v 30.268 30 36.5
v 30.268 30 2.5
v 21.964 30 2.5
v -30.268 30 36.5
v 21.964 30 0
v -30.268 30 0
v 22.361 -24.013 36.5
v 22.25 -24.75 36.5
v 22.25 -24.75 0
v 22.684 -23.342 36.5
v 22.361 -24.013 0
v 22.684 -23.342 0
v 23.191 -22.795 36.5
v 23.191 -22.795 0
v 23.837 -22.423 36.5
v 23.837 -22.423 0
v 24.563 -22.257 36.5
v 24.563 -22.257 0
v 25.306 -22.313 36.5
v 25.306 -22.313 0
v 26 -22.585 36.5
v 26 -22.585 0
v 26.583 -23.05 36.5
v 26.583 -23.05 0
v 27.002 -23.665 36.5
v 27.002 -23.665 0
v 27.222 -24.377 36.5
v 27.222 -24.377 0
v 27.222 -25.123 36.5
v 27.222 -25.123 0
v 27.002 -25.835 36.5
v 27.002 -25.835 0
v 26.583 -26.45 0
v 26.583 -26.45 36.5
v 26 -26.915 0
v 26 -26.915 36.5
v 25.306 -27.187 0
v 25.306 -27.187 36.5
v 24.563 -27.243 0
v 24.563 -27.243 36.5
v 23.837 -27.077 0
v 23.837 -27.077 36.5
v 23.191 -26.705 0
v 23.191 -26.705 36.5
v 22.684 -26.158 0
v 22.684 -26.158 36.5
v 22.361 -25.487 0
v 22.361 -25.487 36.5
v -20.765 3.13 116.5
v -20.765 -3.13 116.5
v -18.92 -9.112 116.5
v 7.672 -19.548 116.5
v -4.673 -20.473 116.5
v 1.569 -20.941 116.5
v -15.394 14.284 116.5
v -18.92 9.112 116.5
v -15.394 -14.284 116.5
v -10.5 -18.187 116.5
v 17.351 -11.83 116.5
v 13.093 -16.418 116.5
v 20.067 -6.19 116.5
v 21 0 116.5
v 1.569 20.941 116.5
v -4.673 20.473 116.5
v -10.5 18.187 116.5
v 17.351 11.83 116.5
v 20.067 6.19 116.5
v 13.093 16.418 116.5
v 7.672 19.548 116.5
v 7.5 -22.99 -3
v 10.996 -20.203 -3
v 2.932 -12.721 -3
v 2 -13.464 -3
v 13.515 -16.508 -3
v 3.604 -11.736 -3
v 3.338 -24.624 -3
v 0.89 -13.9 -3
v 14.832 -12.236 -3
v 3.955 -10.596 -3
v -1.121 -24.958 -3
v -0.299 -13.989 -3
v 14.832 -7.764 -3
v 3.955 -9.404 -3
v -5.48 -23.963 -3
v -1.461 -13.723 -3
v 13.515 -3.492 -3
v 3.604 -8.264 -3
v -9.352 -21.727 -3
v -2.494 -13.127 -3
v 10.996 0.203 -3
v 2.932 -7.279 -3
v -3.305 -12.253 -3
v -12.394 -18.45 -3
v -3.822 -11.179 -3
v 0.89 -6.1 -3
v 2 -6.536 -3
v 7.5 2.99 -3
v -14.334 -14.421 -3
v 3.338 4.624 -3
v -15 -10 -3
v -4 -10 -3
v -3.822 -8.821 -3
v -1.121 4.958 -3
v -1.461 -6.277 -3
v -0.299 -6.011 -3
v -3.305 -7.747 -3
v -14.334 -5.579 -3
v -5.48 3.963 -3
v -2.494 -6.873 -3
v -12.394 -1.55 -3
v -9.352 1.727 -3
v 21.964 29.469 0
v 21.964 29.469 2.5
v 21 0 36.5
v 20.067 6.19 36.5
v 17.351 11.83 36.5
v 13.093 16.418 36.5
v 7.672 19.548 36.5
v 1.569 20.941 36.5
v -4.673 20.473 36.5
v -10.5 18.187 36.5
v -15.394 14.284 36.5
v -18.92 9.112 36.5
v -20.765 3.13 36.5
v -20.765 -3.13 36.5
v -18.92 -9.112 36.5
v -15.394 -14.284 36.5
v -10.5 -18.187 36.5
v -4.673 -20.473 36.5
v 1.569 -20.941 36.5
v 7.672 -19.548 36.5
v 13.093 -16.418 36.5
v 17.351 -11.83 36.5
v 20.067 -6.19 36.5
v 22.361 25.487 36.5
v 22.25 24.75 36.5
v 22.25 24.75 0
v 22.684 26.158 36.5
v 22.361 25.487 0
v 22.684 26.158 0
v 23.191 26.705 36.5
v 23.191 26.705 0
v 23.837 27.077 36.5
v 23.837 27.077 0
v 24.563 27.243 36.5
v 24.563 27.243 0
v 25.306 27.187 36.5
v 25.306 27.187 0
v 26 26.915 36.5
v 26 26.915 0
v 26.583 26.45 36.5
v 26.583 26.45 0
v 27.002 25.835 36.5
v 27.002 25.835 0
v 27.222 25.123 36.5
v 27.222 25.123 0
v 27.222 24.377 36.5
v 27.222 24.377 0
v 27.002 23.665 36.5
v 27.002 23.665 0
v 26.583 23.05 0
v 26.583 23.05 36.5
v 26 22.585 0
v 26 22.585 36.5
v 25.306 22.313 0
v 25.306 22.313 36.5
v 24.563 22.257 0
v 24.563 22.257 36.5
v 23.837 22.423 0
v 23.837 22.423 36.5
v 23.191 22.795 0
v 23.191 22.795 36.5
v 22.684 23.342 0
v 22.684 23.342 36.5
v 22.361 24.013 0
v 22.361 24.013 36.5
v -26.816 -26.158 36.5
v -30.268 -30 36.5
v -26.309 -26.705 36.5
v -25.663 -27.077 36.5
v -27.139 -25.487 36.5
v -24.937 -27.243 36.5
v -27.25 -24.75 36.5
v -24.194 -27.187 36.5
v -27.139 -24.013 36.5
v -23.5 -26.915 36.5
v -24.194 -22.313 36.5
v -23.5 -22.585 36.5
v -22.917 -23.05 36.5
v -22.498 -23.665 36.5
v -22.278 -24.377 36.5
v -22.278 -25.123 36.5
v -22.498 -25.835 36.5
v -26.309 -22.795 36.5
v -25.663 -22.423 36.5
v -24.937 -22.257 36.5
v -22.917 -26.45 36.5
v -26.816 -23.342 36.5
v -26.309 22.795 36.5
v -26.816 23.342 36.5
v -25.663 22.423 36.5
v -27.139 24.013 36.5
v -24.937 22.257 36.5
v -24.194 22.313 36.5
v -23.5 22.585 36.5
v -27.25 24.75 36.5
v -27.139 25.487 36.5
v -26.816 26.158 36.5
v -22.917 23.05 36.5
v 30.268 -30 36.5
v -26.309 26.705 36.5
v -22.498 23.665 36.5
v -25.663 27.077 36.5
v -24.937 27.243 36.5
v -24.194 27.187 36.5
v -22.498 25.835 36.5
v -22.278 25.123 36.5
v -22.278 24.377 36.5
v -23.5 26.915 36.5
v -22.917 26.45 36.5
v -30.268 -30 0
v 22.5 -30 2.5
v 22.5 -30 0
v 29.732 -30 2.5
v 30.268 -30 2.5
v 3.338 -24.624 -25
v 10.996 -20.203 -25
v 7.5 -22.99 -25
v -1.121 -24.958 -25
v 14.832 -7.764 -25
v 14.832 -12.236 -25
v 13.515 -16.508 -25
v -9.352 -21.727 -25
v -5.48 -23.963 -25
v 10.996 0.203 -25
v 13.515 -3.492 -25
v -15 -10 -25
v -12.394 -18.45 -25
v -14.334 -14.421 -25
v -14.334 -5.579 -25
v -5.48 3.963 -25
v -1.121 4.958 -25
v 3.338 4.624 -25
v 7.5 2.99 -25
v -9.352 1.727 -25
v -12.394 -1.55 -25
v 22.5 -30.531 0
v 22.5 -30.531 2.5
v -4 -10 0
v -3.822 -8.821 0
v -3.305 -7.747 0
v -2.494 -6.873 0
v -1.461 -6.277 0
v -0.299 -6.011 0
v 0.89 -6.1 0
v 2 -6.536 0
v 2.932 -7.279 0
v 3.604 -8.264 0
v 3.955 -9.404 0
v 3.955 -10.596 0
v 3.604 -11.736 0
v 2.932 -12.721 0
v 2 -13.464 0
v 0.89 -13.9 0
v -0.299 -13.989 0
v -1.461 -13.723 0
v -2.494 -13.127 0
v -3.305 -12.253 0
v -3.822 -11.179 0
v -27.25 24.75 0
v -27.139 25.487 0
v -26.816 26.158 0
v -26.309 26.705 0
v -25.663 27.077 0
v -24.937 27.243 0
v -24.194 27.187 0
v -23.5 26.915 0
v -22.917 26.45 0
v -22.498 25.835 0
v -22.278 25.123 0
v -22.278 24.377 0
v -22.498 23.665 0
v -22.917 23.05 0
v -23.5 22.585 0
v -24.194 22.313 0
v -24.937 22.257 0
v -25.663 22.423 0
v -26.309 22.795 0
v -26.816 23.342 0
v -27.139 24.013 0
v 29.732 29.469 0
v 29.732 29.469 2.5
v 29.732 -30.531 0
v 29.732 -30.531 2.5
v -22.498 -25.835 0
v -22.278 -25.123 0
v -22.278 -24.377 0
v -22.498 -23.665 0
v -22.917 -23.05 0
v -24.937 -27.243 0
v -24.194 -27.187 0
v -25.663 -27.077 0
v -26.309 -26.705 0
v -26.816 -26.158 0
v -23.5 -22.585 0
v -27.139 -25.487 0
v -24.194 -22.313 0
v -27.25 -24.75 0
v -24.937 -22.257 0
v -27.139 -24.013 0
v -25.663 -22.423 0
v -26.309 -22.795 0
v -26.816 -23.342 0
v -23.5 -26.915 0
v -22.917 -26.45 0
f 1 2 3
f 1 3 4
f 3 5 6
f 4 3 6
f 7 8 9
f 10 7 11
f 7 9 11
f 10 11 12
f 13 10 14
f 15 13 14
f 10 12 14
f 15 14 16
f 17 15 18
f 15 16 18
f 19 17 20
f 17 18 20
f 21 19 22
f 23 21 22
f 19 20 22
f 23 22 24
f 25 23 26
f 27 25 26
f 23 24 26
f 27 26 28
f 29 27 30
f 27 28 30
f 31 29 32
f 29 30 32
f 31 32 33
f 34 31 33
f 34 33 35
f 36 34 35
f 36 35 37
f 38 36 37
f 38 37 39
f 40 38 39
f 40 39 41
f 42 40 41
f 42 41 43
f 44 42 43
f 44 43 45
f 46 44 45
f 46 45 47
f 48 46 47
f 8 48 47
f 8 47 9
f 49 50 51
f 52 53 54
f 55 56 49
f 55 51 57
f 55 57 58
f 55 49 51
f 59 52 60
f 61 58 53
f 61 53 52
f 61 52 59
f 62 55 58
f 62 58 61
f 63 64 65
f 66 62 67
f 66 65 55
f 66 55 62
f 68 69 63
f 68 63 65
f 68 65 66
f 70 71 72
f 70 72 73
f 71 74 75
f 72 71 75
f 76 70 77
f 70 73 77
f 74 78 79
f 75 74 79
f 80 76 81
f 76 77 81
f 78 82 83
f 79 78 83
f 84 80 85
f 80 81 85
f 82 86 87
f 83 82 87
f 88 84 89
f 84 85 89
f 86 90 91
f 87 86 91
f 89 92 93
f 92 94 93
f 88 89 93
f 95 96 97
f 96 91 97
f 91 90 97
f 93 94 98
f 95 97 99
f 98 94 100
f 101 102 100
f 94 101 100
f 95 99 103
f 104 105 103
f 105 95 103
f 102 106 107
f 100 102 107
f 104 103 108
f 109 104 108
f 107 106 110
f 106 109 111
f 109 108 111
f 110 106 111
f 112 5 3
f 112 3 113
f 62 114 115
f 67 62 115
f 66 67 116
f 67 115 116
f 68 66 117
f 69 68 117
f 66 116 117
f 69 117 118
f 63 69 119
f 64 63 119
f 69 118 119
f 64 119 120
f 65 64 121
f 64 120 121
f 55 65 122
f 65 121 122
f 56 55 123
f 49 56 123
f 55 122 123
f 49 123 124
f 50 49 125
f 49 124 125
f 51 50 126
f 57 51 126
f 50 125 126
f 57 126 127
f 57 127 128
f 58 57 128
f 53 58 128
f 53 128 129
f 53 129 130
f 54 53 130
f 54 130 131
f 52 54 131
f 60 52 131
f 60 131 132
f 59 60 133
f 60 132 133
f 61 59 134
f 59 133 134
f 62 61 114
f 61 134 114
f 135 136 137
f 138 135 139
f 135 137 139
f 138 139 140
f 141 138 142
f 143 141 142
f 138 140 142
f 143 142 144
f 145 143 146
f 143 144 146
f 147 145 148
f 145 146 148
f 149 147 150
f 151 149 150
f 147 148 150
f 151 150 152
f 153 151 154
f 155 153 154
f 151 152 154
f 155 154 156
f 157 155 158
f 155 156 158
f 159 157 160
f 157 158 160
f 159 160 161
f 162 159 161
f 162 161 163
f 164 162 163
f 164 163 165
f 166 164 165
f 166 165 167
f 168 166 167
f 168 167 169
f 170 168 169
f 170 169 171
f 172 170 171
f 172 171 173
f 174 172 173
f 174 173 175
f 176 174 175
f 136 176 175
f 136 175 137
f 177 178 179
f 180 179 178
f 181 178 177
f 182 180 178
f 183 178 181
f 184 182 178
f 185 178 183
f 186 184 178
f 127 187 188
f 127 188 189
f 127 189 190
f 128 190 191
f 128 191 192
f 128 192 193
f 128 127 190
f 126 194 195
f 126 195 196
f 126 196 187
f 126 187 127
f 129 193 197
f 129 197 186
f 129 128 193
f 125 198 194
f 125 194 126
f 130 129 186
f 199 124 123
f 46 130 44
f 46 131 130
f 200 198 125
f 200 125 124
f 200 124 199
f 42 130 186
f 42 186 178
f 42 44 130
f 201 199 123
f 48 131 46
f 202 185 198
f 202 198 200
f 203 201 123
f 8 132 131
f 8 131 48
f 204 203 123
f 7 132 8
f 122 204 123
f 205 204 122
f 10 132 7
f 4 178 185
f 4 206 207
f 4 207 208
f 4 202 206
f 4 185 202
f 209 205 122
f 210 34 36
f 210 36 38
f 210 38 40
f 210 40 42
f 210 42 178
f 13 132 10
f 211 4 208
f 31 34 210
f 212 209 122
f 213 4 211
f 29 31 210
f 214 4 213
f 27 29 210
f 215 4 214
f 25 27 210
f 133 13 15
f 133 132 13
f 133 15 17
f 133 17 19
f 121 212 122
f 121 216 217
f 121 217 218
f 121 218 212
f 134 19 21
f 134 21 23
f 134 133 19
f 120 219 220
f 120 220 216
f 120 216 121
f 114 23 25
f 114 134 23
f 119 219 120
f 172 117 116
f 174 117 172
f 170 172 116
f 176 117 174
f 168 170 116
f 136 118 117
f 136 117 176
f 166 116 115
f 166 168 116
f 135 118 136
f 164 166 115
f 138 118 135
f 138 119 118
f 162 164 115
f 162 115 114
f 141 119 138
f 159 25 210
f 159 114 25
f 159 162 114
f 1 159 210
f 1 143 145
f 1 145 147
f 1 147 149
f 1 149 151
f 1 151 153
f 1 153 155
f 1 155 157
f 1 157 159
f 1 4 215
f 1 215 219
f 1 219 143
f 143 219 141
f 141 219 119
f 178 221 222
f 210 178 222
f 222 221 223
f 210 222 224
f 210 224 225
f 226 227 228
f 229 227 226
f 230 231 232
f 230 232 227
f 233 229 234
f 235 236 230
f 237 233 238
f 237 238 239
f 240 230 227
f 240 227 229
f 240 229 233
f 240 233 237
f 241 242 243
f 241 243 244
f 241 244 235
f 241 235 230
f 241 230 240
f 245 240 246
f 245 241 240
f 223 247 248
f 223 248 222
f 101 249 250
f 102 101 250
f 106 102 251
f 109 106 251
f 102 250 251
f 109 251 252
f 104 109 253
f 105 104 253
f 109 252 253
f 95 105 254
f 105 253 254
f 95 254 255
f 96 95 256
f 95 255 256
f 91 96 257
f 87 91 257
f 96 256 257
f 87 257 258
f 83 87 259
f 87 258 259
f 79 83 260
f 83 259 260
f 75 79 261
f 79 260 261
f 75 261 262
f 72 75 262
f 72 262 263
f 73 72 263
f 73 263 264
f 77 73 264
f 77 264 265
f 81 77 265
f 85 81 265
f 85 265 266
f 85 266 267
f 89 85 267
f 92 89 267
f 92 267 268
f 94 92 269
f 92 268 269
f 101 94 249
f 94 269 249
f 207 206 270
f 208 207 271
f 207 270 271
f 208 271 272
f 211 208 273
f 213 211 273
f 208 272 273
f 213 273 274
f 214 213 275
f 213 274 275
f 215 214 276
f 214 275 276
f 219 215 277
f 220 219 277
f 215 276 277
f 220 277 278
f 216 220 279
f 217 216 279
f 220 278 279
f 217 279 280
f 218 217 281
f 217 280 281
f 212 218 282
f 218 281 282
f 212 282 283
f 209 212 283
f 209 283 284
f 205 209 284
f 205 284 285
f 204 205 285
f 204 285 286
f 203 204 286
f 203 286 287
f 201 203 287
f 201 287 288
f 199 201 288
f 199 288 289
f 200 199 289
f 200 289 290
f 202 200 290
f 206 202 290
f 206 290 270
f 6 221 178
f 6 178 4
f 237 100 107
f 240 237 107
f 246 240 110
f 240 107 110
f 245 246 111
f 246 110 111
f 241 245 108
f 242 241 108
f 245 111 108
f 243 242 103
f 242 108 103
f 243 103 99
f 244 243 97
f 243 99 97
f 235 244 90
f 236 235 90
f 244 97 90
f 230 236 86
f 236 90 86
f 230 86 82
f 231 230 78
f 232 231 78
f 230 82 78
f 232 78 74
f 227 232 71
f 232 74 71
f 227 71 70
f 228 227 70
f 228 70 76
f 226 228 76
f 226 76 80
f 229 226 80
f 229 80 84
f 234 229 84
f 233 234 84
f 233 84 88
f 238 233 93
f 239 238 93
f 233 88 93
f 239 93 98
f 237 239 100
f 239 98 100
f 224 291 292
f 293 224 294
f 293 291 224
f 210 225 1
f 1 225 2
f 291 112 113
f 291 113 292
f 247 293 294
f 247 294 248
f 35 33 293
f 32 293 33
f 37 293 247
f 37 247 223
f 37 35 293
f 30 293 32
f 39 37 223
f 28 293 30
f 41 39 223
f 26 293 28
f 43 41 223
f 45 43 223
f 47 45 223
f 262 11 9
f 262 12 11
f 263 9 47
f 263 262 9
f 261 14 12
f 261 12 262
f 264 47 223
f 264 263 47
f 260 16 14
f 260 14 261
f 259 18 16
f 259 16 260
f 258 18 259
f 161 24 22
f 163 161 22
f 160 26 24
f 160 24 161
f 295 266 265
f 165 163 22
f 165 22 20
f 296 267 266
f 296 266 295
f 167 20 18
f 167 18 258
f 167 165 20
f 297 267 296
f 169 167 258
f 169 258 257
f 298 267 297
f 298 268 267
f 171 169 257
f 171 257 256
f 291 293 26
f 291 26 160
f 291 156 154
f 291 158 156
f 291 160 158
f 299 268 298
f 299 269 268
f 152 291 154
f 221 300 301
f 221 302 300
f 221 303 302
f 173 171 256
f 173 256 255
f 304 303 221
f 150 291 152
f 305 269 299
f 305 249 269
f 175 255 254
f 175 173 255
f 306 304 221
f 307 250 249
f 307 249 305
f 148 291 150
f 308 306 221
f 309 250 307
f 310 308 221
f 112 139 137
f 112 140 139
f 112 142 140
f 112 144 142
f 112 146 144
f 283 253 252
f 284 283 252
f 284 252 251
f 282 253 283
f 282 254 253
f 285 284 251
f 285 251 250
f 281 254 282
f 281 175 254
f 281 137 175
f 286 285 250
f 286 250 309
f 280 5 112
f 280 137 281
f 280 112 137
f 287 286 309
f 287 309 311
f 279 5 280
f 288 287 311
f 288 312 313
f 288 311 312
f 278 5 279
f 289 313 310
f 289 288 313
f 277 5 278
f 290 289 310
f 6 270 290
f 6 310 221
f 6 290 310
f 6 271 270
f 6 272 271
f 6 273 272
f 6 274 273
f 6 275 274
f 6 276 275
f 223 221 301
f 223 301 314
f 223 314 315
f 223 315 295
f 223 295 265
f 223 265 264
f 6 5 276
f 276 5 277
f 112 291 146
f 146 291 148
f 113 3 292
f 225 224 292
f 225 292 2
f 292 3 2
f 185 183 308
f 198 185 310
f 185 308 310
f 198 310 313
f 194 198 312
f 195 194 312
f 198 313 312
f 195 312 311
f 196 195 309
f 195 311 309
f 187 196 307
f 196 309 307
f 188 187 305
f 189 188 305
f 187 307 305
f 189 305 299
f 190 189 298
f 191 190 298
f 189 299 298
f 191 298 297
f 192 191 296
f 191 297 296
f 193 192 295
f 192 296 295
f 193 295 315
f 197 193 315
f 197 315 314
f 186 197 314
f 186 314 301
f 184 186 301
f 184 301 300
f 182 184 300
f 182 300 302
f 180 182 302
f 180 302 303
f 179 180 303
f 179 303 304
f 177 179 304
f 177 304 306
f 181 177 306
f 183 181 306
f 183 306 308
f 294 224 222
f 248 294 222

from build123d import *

# Parameters (mm, degrees)
BOSS_EXTRUDE1_DEPTH = 2.5
SKETCH3_W           = 45
SKETCH3_H           = 1.418134712
SKETCH3_W_2         = 44.463900584
SKETCH3_H_2         = 3.684459624
BOSS_EXTRUDE2_DEPTH = 31.5
SKETCH4_W           = 60.536099416
SKETCH4_H           = 60
BOSS_EXTRUDE3_DEPTH = 34
SKETCH5_R           = 21
BOSS_EXTRUDE4_DEPTH = 80
SKETCH6_R           = 4
BOSS_EXTRUDE5_DEPTH = 3
SKETCH7_R           = 15
BOSS_EXTRUDE6_DEPTH = 22
SKETCH13_R          = 2
CUT_EXTRUDE1_DEPTH  = 3
CUT_EXTRUDE2_START  = -3
SKETCH14_R          = 2
CUT_EXTRUDE2_DEPTH  = 3
SKETCH15_R          = 2.5
SKETCH15_W          = 52.231950292
SKETCH15_H          = 11.081865288
SKETCH15_W_2        = 52.768049708
SKETCH15_H_2        = 8.918134712
CUT_EXTRUDE3_DEPTH  = 128.185394164


with BuildPart() as part:
    # Sketch2 → Boss-Extrude1 (new body)
    with BuildSketch(Plane.XY):
        Polygon((-30.268049708, -30), (-30.268049708, 31.081865288), (-22.5, 31.081865288), (-22.5, 41.081865288), (21.963900584, 41.081865288), (21.963900584, 29.468648207), (29.731950292, 29.468648207), (29.731950292, -30.531351793), (22.5, -30.531351793), (22.5, -38.918134712), (-22.5, -38.918134712), (-22.5, -30), align=None)
    extrude(amount=BOSS_EXTRUDE1_DEPTH)

    # Sketch3 → Boss-Extrude2 (add)
    with BuildSketch(Plane.XY.offset(2.5)):
        with Locations((0, -38.209067356)):
            Rectangle(SKETCH3_W, SKETCH3_H)
        with Locations((-0.268049708, 39.239635476)):
            Rectangle(SKETCH3_W_2, SKETCH3_H_2)
    extrude(amount=BOSS_EXTRUDE2_DEPTH)

    # Sketch4 → Boss-Extrude3 (add)
    with BuildSketch(Plane.XY.offset(2.5)):
        Rectangle(SKETCH4_W, SKETCH4_H)
    extrude(amount=BOSS_EXTRUDE3_DEPTH)

    # Sketch5 → Boss-Extrude4 (add)
    with BuildSketch(Plane.XY.offset(36.5)):
        Circle(SKETCH5_R)
    extrude(amount=BOSS_EXTRUDE4_DEPTH)

    # Sketch6 → Boss-Extrude5 (add)
    with BuildSketch(Plane(origin=(0, 0, 0), x_dir=(-1, 0, 0), z_dir=(0, 0, -1))):
        with Locations((0, -10)):
            Circle(SKETCH6_R)
    extrude(amount=BOSS_EXTRUDE5_DEPTH)

    # Sketch7 → Boss-Extrude6 (add)
    with BuildSketch(Plane(origin=(0, 0, -3), x_dir=(-1, 0, 0), z_dir=(0, 0, -1))):
        with Locations((0, -10)):
            Circle(SKETCH7_R)
    extrude(amount=BOSS_EXTRUDE6_DEPTH)

    # Sketch13 → Cut-Extrude1 (cut)
    with BuildSketch(Plane(origin=(0, 41.081865288, 0), x_dir=(1, 0, 0), z_dir=(0, 1, 0))):
        with Locations(Location((-12.5, -14, 0), (0, 0, 270))):
            Circle(SKETCH13_R)
        with Locations(Location((12.5, -14, 0), (0, 0, 270))):
            Circle(SKETCH13_R)
        with Locations(Location((-12.5, -26, 0), (0, 0, 270))):
            Circle(SKETCH13_R)
        with Locations(Location((12.5, -26, 0), (0, 0, 270))):
            Circle(SKETCH13_R)
    extrude(amount=-CUT_EXTRUDE1_DEPTH, mode=Mode.SUBTRACT)

    # Sketch14 → Cut-Extrude2 (cut)
    with BuildSketch(Plane.XZ.offset(38.918134712).offset(CUT_EXTRUDE2_START)):
        with Locations(Location((12.5, 26, 0), (0, 0, 90))):
            Circle(SKETCH14_R)
        with Locations(Location((12.5, 14, 0), (0, 0, 90))):
            Circle(SKETCH14_R)
        with Locations(Location((-12.5, 14, 0), (0, 0, 90))):
            Circle(SKETCH14_R)
        with Locations(Location((-12.5, 26, 0), (0, 0, 90))):
            Circle(SKETCH14_R)
    extrude(amount=CUT_EXTRUDE2_DEPTH, mode=Mode.SUBTRACT)

    # Sketch15 → Cut-Extrude3 (cut, through all)
    with BuildSketch(Plane(origin=(0, 0, 0), x_dir=(-1, 0, 0), z_dir=(0, 0, -1))):
        with Locations((-24.75, 24.75)):
            Circle(SKETCH15_R)
        with Locations((24.75, 24.75)):
            Circle(SKETCH15_R)
        with Locations((24.75, -24.75)):
            Circle(SKETCH15_R)
        with Locations((-24.75, -24.75)):
            Circle(SKETCH15_R)
        with Locations((4.152074562, 35.540932644)):
            Rectangle(SKETCH15_W, SKETCH15_H)
        with Locations((3.884024854, -34.459067356)):
            Rectangle(SKETCH15_W_2, SKETCH15_H_2)
    extrude(amount=-CUT_EXTRUDE3_DEPTH, mode=Mode.SUBTRACT)


solid = part.part
